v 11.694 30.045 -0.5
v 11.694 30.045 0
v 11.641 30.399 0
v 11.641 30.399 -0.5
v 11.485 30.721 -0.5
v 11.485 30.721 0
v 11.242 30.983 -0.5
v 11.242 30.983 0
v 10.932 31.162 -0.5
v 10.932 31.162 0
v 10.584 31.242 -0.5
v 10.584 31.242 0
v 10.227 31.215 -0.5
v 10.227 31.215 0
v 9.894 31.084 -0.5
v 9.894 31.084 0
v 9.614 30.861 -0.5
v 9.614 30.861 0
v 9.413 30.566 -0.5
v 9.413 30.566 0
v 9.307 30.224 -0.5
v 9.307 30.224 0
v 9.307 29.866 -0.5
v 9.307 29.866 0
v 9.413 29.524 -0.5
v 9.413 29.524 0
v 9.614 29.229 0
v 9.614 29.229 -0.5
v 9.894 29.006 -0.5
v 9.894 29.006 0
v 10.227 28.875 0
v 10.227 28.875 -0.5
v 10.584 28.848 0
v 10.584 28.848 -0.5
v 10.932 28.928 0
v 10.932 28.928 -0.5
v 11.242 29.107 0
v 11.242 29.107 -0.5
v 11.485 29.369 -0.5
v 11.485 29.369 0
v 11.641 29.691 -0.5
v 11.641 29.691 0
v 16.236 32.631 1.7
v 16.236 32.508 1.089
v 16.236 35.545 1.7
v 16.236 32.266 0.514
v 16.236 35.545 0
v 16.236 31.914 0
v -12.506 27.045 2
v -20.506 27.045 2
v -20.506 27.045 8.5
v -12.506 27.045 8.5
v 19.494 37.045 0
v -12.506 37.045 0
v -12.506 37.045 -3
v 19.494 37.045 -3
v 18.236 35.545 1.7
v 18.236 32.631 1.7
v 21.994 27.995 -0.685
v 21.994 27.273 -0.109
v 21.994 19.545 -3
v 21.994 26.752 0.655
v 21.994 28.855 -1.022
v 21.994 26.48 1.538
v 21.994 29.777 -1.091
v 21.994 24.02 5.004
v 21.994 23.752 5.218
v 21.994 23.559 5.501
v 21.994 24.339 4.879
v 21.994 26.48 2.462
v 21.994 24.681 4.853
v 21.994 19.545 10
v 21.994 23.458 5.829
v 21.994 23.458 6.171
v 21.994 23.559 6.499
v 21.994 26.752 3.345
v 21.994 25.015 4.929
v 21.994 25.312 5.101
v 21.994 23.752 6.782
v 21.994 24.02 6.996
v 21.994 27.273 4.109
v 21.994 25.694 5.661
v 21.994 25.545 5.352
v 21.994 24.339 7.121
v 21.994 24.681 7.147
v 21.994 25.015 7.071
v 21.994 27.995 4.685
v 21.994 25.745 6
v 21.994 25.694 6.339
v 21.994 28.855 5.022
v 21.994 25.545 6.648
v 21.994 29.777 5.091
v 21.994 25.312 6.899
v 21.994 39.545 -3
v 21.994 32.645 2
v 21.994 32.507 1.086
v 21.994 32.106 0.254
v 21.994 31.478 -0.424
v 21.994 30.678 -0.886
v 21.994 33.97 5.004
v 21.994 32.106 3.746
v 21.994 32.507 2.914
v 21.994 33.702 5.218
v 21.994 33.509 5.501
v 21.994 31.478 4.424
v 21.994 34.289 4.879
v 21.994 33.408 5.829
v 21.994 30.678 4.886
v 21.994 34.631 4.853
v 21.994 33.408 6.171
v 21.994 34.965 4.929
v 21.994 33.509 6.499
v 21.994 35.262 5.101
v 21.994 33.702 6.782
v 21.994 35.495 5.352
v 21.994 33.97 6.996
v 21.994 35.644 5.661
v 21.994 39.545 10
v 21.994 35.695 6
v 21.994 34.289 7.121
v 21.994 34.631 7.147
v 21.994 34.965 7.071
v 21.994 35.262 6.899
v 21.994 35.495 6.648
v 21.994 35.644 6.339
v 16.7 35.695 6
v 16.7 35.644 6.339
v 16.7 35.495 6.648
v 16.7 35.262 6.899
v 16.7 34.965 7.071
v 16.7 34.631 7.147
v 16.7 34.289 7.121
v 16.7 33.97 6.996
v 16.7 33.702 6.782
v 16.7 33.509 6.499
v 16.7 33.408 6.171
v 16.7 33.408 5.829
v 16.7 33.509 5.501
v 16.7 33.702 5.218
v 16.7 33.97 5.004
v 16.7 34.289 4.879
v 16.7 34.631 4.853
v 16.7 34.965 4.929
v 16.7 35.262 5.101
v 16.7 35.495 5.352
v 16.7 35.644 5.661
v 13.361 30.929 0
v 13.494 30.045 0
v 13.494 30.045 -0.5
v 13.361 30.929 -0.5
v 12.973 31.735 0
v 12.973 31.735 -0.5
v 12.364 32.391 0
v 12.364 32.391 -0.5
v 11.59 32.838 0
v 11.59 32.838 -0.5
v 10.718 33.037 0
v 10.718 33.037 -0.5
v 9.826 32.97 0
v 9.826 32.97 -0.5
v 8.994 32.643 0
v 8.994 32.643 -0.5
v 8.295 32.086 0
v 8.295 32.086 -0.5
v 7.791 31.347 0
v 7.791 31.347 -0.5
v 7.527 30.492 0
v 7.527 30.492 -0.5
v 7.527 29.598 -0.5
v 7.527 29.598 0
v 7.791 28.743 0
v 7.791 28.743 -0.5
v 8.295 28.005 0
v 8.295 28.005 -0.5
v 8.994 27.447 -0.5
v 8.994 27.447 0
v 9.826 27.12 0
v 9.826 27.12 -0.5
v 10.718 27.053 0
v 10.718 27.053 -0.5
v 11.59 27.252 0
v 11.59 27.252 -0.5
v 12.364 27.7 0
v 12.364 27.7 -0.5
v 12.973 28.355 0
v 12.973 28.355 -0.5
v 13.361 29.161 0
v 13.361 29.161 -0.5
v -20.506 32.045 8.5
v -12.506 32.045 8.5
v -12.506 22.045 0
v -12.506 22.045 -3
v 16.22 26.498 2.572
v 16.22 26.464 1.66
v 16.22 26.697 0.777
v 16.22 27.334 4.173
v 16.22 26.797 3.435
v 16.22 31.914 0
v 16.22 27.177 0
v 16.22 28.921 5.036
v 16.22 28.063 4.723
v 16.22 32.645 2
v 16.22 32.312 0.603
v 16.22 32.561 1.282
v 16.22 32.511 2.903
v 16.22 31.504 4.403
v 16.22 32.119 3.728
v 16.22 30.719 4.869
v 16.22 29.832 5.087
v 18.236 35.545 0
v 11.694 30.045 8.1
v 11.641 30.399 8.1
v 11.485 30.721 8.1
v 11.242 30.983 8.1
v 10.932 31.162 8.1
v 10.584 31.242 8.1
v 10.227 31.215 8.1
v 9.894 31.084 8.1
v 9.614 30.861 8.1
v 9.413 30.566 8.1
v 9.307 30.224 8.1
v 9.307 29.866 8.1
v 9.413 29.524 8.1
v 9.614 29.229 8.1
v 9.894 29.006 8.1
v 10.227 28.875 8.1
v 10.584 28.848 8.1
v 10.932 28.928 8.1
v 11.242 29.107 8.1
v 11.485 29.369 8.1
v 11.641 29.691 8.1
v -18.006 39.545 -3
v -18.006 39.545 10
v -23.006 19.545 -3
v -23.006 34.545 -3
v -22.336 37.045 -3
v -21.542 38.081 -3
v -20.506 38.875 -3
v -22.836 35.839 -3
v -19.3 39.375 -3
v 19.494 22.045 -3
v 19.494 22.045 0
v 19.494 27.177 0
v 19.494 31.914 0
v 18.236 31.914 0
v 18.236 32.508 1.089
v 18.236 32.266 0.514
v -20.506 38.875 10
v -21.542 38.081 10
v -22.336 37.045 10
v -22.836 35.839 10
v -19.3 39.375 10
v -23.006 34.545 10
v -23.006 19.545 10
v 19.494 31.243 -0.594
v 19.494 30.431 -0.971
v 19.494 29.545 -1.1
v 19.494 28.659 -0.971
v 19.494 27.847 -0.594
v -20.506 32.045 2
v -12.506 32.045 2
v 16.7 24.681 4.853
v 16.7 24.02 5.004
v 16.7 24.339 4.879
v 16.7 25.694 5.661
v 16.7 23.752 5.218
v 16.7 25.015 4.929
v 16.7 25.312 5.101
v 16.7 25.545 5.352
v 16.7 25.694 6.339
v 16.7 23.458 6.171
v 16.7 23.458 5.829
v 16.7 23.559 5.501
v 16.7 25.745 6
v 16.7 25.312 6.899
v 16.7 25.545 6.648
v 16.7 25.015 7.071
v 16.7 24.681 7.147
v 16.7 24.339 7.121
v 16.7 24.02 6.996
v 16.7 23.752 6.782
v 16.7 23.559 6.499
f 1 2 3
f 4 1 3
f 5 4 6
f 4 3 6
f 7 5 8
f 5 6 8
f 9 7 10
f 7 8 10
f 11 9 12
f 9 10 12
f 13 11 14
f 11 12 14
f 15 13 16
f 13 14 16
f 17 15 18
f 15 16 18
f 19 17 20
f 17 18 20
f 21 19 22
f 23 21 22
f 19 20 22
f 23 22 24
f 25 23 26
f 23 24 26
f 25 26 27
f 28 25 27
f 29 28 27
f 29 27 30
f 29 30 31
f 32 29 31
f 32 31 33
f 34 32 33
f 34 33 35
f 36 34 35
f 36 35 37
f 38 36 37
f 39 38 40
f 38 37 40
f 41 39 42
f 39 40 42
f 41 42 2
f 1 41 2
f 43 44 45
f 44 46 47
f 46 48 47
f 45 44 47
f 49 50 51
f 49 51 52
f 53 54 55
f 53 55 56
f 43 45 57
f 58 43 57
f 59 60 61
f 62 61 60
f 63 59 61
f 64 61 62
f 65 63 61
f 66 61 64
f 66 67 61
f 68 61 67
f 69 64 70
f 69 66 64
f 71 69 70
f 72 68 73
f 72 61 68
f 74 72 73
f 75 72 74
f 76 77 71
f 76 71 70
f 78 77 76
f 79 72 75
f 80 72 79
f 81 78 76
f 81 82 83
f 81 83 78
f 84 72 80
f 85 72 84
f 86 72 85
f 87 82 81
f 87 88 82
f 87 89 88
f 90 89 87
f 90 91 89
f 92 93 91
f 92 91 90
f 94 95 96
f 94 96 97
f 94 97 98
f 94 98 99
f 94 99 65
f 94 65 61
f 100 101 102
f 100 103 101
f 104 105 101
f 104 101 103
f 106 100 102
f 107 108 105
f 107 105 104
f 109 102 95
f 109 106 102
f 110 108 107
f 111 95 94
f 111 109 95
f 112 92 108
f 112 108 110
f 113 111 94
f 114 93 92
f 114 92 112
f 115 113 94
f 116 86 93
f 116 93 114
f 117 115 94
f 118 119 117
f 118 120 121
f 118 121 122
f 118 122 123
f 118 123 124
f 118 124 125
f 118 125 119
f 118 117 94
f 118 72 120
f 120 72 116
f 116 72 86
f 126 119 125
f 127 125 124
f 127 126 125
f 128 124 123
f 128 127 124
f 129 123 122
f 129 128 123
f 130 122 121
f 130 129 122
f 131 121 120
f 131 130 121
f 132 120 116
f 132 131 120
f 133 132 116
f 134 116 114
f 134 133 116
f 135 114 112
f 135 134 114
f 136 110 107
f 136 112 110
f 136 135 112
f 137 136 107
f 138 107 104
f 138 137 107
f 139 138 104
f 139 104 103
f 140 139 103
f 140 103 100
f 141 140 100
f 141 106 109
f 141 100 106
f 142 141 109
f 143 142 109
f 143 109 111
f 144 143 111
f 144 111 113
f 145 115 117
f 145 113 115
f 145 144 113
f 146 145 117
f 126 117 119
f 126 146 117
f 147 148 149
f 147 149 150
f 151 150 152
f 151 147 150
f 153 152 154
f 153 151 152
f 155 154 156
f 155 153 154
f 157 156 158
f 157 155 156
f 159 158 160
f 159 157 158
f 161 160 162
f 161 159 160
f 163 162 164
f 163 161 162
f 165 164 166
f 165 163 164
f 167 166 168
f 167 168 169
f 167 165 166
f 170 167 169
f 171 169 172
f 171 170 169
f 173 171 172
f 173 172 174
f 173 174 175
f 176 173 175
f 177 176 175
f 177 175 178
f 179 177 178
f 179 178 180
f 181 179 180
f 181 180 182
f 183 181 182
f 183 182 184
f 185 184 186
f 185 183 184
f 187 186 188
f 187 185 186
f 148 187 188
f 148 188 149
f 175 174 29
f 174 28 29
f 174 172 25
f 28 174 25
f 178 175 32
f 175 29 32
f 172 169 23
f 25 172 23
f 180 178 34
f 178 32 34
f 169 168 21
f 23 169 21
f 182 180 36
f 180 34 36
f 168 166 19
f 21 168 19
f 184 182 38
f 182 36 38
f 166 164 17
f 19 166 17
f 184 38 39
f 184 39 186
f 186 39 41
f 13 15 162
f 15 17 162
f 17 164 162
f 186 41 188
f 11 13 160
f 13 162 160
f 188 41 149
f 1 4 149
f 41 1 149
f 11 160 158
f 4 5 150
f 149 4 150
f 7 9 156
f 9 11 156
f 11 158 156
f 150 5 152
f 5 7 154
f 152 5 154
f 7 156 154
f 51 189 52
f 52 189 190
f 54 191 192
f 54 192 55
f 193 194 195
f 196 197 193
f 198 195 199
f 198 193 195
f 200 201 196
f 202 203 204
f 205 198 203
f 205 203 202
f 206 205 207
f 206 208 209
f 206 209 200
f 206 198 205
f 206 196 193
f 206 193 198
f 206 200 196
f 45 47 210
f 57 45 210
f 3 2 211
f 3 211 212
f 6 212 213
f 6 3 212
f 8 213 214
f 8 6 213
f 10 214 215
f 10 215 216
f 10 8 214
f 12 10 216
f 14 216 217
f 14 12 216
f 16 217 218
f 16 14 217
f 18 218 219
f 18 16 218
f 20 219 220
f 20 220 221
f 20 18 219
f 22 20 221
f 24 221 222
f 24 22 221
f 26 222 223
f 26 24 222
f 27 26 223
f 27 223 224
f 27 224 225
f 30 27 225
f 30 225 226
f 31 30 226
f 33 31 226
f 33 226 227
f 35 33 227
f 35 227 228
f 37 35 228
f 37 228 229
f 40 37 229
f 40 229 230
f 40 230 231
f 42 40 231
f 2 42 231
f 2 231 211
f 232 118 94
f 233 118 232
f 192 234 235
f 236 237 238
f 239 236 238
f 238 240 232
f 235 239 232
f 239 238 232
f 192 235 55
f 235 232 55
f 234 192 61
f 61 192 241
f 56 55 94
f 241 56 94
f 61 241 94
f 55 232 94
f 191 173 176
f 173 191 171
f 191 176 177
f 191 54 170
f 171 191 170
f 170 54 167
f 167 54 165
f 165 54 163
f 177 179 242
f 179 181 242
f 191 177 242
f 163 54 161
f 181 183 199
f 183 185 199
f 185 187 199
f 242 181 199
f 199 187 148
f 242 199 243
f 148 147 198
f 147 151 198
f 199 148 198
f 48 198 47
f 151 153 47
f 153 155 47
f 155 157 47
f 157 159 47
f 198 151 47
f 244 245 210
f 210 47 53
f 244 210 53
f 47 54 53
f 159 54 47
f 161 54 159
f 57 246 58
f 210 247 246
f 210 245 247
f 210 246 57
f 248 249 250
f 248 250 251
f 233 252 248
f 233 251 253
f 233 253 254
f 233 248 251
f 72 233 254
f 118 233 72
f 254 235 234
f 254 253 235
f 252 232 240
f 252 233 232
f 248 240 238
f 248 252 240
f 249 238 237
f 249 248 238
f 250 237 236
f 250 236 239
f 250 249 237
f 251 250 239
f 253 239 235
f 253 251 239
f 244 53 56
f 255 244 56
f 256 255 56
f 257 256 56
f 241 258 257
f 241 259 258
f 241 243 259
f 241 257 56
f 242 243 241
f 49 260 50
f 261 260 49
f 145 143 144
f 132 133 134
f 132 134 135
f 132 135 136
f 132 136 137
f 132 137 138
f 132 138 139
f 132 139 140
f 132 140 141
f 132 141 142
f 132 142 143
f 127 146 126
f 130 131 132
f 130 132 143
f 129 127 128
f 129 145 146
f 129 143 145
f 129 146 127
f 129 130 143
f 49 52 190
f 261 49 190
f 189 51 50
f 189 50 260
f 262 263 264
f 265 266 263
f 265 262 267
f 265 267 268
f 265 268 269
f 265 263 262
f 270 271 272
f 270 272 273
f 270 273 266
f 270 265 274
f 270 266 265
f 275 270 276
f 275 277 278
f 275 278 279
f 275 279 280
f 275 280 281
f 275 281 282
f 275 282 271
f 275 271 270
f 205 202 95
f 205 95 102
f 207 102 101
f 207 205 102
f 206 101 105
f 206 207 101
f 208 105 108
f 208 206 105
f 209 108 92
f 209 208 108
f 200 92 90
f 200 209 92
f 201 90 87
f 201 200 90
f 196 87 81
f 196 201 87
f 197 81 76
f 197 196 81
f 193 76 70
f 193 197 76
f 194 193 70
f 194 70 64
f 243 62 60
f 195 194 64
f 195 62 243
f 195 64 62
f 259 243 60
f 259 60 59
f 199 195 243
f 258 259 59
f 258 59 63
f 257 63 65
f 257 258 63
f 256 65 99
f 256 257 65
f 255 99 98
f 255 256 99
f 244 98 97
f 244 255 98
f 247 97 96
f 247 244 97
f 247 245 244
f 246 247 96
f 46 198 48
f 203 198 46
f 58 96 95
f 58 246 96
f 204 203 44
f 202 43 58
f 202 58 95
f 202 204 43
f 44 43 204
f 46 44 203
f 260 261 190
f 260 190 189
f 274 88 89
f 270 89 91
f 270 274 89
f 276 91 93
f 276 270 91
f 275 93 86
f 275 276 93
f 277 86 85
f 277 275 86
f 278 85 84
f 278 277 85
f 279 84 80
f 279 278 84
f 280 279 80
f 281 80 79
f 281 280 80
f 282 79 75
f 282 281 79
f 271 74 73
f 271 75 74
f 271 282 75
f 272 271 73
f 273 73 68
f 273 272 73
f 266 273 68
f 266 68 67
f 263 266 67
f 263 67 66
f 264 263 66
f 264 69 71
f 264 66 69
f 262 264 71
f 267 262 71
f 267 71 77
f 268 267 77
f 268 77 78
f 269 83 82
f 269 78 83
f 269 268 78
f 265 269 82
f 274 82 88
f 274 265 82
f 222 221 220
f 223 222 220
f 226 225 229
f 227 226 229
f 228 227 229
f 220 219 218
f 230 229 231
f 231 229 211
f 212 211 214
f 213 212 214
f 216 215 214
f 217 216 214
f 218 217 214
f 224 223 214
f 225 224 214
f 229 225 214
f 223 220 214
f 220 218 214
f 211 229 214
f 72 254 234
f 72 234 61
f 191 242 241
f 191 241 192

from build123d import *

# Parameters (mm, degrees)
F0_W          = 4
F0_H          = 5
F0_R          = 3
F0_W_2        = 2
F0_H_2        = 8
F0_R_2        = 1.2
F1_DEPTH      = 10
F2_DEPTH      = 3
F3_START      = 2
F1_FACE_W     = 45
F1_FACE_H     = 20
F3_DEPTH      = 6.5
F4_START      = 5
F4_DEPTH      = 1.5
F5_R          = 5
F6_DEPTH      = 8.1
F7_DEPTH      = 3
F7_DEPTH_BACK = 0.5
F8_DEPTH      = 25
F8_DEPTH_BACK = 1.7
F10_START     = 16.22
F9_R          = 3.1
F10_DEPTH     = 9.58
F11_START     = 16.7
F9_R_2        = 1.15
F11_DEPTH     = 21.7


with BuildPart() as f1:
    # F0 (on Top) → F1 (new body)
    with BuildSketch(Plane.XY):
        Polygon((21.9938950613, 39.5450913161), (-23.0061049387, 39.5450913161), (-23.0061049387, 19.5450913161), (-9.9312635139, 19.5450913161), (10.0687364861, 19.5450913161), (21.9938950613, 19.5450913161), align=None)
        Polygon((-12.5061049387, 32.0450913161), (-12.5061049387, 37.0450913161), (19.4938950613, 37.0450913161), (19.4938950613, 22.0450913161), (-12.5061049387, 22.0450913161), (-12.5061049387, 27.0450913161), (-16.5061049387, 27.0450913161), (-20.5061049387, 27.0450913161), (-20.5061049387, 32.0450913161), (-16.5061049387, 32.0450913161), align=None, mode=Mode.SUBTRACT)
        with Locations((-18.5061049387, 29.5450913161)):
            Rectangle(F0_W, F0_H)
        with Locations((-14.5061049387, 29.5450913161)):
            Rectangle(F0_W, F0_H)
        Polygon((19.4938950613, 37.0450913161), (-12.5061049387, 37.0450913161), (-12.5061049387, 32.0450913161), (-12.5061049387, 27.0450913161), (-12.5061049387, 22.0450913161), (19.4938950613, 22.0450913161), align=None)
        with Locations((10.4938950613, 30.0450913161)):
            Circle(F0_R, mode=Mode.SUBTRACT)
        with Locations((17.2357911468, 31.5450913161)):
            Rectangle(F0_W_2, F0_H_2, mode=Mode.SUBTRACT)
        with Locations((10.4938950613, 30.0450913161)):
            Circle(F0_R)
        with Locations((10.4938950613, 30.0450913161)):
            Circle(F0_R_2, mode=Mode.SUBTRACT)
        with Locations((10.4938950613, 30.0450913161)):
            Circle(F0_R_2)
        with Locations((17.2357911468, 31.5450913161)):
            Rectangle(F0_W_2, F0_H_2)
    extrude(amount=F1_DEPTH)

    # F0 (on Top) → F2 (join)
    with BuildSketch(Plane.XY):
        Polygon((21.9938950613, 39.5450913161), (-23.0061049387, 39.5450913161), (-23.0061049387, 19.5450913161), (-9.9312635139, 19.5450913161), (10.0687364861, 19.5450913161), (21.9938950613, 19.5450913161), align=None)
        Polygon((-12.5061049387, 32.0450913161), (-12.5061049387, 37.0450913161), (19.4938950613, 37.0450913161), (19.4938950613, 22.0450913161), (-12.5061049387, 22.0450913161), (-12.5061049387, 27.0450913161), (-16.5061049387, 27.0450913161), (-20.5061049387, 27.0450913161), (-20.5061049387, 32.0450913161), (-16.5061049387, 32.0450913161), align=None, mode=Mode.SUBTRACT)
        with Locations((-14.5061049387, 29.5450913161)):
            Rectangle(F0_W, F0_H)
        with Locations((-18.5061049387, 29.5450913161)):
            Rectangle(F0_W, F0_H)
    extrude(amount=-F2_DEPTH)

    # F0 (on Top) + F1_face (on face) → F3 (cut)
    with BuildSketch(Plane.XY.offset(F3_START)):
        with Locations((-18.5061049387, 29.5450913161)):
            Rectangle(F0_W, F0_H)
        with Locations((-14.5061049387, 29.5450913161)):
            Rectangle(F0_W, F0_H)
    with BuildSketch(Plane(origin=(-0.5061049387, 29.5450913161, 10), x_dir=(1, 0, 0), z_dir=(0, 0, 1)).offset(F3_START)):
        Rectangle(F1_FACE_W, F1_FACE_H)
    extrude(amount=F3_DEPTH, mode=Mode.SUBTRACT)

    # F5
    f5_edges = [f1.edges().sort_by_distance(p)[0] for p in [
        (-23.006105, 39.545091, 3.5),
    ]]
    fillet(f5_edges, radius=F5_R)

    # F0 (on Top) → F6 (cut)
    with BuildSketch(Plane.XY):
        with Locations((10.4938950613, 30.0450913161)):
            Circle(F0_R_2)
    extrude(amount=F6_DEPTH, mode=Mode.SUBTRACT)



with BuildPart() as f4:
    # F0 (on Top) → F4 (new body)
    with BuildSketch(Plane.XY.offset(F4_START)):
        with Locations((10.4938950613, 30.0450913161)):
            Circle(F0_R)
        with Locations((10.4938950613, 30.0450913161)):
            Circle(F0_R_2, mode=Mode.SUBTRACT)
    extrude(amount=F4_DEPTH)


with BuildPart() as f1_1:
    add(f1.part)

    add(f4.part)  # F7 merges F4
    # F0 (on Top) → F7 (join, two sides)
    with BuildSketch(Plane.XY) as f7_sk:
        with Locations((10.4938950613, 30.0450913161)):
            Circle(F0_R)
        with Locations((10.4938950613, 30.0450913161)):
            Circle(F0_R_2, mode=Mode.SUBTRACT)
    extrude(amount=F7_DEPTH)
    extrude(f7_sk.sketch, amount=-F7_DEPTH_BACK)

    # F0 (on Top) → F8 (cut, two sides)
    with BuildSketch(Plane.XY) as f8_sk:
        with Locations((17.2357911468, 31.5450913161)):
            Rectangle(F0_W_2, F0_H_2)
    extrude(amount=-F8_DEPTH, mode=Mode.SUBTRACT)
    extrude(f8_sk.sketch, amount=F8_DEPTH_BACK, mode=Mode.SUBTRACT)

    # F9 (on Right) → F10 (cut)
    with BuildSketch(Plane.YZ.offset(F10_START)):
        with Locations((29.5450913161, 2)):
            Circle(F9_R)
    extrude(amount=F10_DEPTH, mode=Mode.SUBTRACT)

    # F9 (on Right) → F11 (cut)
    with BuildSketch(Plane.YZ.offset(F11_START)):
        with Locations((34.5450913161, 6)):
            Circle(F9_R_2)
        with Locations((24.595216945, 6)):
            Circle(F9_R_2)
    extrude(amount=F11_DEPTH, mode=Mode.SUBTRACT)


solid = f1_1.part
